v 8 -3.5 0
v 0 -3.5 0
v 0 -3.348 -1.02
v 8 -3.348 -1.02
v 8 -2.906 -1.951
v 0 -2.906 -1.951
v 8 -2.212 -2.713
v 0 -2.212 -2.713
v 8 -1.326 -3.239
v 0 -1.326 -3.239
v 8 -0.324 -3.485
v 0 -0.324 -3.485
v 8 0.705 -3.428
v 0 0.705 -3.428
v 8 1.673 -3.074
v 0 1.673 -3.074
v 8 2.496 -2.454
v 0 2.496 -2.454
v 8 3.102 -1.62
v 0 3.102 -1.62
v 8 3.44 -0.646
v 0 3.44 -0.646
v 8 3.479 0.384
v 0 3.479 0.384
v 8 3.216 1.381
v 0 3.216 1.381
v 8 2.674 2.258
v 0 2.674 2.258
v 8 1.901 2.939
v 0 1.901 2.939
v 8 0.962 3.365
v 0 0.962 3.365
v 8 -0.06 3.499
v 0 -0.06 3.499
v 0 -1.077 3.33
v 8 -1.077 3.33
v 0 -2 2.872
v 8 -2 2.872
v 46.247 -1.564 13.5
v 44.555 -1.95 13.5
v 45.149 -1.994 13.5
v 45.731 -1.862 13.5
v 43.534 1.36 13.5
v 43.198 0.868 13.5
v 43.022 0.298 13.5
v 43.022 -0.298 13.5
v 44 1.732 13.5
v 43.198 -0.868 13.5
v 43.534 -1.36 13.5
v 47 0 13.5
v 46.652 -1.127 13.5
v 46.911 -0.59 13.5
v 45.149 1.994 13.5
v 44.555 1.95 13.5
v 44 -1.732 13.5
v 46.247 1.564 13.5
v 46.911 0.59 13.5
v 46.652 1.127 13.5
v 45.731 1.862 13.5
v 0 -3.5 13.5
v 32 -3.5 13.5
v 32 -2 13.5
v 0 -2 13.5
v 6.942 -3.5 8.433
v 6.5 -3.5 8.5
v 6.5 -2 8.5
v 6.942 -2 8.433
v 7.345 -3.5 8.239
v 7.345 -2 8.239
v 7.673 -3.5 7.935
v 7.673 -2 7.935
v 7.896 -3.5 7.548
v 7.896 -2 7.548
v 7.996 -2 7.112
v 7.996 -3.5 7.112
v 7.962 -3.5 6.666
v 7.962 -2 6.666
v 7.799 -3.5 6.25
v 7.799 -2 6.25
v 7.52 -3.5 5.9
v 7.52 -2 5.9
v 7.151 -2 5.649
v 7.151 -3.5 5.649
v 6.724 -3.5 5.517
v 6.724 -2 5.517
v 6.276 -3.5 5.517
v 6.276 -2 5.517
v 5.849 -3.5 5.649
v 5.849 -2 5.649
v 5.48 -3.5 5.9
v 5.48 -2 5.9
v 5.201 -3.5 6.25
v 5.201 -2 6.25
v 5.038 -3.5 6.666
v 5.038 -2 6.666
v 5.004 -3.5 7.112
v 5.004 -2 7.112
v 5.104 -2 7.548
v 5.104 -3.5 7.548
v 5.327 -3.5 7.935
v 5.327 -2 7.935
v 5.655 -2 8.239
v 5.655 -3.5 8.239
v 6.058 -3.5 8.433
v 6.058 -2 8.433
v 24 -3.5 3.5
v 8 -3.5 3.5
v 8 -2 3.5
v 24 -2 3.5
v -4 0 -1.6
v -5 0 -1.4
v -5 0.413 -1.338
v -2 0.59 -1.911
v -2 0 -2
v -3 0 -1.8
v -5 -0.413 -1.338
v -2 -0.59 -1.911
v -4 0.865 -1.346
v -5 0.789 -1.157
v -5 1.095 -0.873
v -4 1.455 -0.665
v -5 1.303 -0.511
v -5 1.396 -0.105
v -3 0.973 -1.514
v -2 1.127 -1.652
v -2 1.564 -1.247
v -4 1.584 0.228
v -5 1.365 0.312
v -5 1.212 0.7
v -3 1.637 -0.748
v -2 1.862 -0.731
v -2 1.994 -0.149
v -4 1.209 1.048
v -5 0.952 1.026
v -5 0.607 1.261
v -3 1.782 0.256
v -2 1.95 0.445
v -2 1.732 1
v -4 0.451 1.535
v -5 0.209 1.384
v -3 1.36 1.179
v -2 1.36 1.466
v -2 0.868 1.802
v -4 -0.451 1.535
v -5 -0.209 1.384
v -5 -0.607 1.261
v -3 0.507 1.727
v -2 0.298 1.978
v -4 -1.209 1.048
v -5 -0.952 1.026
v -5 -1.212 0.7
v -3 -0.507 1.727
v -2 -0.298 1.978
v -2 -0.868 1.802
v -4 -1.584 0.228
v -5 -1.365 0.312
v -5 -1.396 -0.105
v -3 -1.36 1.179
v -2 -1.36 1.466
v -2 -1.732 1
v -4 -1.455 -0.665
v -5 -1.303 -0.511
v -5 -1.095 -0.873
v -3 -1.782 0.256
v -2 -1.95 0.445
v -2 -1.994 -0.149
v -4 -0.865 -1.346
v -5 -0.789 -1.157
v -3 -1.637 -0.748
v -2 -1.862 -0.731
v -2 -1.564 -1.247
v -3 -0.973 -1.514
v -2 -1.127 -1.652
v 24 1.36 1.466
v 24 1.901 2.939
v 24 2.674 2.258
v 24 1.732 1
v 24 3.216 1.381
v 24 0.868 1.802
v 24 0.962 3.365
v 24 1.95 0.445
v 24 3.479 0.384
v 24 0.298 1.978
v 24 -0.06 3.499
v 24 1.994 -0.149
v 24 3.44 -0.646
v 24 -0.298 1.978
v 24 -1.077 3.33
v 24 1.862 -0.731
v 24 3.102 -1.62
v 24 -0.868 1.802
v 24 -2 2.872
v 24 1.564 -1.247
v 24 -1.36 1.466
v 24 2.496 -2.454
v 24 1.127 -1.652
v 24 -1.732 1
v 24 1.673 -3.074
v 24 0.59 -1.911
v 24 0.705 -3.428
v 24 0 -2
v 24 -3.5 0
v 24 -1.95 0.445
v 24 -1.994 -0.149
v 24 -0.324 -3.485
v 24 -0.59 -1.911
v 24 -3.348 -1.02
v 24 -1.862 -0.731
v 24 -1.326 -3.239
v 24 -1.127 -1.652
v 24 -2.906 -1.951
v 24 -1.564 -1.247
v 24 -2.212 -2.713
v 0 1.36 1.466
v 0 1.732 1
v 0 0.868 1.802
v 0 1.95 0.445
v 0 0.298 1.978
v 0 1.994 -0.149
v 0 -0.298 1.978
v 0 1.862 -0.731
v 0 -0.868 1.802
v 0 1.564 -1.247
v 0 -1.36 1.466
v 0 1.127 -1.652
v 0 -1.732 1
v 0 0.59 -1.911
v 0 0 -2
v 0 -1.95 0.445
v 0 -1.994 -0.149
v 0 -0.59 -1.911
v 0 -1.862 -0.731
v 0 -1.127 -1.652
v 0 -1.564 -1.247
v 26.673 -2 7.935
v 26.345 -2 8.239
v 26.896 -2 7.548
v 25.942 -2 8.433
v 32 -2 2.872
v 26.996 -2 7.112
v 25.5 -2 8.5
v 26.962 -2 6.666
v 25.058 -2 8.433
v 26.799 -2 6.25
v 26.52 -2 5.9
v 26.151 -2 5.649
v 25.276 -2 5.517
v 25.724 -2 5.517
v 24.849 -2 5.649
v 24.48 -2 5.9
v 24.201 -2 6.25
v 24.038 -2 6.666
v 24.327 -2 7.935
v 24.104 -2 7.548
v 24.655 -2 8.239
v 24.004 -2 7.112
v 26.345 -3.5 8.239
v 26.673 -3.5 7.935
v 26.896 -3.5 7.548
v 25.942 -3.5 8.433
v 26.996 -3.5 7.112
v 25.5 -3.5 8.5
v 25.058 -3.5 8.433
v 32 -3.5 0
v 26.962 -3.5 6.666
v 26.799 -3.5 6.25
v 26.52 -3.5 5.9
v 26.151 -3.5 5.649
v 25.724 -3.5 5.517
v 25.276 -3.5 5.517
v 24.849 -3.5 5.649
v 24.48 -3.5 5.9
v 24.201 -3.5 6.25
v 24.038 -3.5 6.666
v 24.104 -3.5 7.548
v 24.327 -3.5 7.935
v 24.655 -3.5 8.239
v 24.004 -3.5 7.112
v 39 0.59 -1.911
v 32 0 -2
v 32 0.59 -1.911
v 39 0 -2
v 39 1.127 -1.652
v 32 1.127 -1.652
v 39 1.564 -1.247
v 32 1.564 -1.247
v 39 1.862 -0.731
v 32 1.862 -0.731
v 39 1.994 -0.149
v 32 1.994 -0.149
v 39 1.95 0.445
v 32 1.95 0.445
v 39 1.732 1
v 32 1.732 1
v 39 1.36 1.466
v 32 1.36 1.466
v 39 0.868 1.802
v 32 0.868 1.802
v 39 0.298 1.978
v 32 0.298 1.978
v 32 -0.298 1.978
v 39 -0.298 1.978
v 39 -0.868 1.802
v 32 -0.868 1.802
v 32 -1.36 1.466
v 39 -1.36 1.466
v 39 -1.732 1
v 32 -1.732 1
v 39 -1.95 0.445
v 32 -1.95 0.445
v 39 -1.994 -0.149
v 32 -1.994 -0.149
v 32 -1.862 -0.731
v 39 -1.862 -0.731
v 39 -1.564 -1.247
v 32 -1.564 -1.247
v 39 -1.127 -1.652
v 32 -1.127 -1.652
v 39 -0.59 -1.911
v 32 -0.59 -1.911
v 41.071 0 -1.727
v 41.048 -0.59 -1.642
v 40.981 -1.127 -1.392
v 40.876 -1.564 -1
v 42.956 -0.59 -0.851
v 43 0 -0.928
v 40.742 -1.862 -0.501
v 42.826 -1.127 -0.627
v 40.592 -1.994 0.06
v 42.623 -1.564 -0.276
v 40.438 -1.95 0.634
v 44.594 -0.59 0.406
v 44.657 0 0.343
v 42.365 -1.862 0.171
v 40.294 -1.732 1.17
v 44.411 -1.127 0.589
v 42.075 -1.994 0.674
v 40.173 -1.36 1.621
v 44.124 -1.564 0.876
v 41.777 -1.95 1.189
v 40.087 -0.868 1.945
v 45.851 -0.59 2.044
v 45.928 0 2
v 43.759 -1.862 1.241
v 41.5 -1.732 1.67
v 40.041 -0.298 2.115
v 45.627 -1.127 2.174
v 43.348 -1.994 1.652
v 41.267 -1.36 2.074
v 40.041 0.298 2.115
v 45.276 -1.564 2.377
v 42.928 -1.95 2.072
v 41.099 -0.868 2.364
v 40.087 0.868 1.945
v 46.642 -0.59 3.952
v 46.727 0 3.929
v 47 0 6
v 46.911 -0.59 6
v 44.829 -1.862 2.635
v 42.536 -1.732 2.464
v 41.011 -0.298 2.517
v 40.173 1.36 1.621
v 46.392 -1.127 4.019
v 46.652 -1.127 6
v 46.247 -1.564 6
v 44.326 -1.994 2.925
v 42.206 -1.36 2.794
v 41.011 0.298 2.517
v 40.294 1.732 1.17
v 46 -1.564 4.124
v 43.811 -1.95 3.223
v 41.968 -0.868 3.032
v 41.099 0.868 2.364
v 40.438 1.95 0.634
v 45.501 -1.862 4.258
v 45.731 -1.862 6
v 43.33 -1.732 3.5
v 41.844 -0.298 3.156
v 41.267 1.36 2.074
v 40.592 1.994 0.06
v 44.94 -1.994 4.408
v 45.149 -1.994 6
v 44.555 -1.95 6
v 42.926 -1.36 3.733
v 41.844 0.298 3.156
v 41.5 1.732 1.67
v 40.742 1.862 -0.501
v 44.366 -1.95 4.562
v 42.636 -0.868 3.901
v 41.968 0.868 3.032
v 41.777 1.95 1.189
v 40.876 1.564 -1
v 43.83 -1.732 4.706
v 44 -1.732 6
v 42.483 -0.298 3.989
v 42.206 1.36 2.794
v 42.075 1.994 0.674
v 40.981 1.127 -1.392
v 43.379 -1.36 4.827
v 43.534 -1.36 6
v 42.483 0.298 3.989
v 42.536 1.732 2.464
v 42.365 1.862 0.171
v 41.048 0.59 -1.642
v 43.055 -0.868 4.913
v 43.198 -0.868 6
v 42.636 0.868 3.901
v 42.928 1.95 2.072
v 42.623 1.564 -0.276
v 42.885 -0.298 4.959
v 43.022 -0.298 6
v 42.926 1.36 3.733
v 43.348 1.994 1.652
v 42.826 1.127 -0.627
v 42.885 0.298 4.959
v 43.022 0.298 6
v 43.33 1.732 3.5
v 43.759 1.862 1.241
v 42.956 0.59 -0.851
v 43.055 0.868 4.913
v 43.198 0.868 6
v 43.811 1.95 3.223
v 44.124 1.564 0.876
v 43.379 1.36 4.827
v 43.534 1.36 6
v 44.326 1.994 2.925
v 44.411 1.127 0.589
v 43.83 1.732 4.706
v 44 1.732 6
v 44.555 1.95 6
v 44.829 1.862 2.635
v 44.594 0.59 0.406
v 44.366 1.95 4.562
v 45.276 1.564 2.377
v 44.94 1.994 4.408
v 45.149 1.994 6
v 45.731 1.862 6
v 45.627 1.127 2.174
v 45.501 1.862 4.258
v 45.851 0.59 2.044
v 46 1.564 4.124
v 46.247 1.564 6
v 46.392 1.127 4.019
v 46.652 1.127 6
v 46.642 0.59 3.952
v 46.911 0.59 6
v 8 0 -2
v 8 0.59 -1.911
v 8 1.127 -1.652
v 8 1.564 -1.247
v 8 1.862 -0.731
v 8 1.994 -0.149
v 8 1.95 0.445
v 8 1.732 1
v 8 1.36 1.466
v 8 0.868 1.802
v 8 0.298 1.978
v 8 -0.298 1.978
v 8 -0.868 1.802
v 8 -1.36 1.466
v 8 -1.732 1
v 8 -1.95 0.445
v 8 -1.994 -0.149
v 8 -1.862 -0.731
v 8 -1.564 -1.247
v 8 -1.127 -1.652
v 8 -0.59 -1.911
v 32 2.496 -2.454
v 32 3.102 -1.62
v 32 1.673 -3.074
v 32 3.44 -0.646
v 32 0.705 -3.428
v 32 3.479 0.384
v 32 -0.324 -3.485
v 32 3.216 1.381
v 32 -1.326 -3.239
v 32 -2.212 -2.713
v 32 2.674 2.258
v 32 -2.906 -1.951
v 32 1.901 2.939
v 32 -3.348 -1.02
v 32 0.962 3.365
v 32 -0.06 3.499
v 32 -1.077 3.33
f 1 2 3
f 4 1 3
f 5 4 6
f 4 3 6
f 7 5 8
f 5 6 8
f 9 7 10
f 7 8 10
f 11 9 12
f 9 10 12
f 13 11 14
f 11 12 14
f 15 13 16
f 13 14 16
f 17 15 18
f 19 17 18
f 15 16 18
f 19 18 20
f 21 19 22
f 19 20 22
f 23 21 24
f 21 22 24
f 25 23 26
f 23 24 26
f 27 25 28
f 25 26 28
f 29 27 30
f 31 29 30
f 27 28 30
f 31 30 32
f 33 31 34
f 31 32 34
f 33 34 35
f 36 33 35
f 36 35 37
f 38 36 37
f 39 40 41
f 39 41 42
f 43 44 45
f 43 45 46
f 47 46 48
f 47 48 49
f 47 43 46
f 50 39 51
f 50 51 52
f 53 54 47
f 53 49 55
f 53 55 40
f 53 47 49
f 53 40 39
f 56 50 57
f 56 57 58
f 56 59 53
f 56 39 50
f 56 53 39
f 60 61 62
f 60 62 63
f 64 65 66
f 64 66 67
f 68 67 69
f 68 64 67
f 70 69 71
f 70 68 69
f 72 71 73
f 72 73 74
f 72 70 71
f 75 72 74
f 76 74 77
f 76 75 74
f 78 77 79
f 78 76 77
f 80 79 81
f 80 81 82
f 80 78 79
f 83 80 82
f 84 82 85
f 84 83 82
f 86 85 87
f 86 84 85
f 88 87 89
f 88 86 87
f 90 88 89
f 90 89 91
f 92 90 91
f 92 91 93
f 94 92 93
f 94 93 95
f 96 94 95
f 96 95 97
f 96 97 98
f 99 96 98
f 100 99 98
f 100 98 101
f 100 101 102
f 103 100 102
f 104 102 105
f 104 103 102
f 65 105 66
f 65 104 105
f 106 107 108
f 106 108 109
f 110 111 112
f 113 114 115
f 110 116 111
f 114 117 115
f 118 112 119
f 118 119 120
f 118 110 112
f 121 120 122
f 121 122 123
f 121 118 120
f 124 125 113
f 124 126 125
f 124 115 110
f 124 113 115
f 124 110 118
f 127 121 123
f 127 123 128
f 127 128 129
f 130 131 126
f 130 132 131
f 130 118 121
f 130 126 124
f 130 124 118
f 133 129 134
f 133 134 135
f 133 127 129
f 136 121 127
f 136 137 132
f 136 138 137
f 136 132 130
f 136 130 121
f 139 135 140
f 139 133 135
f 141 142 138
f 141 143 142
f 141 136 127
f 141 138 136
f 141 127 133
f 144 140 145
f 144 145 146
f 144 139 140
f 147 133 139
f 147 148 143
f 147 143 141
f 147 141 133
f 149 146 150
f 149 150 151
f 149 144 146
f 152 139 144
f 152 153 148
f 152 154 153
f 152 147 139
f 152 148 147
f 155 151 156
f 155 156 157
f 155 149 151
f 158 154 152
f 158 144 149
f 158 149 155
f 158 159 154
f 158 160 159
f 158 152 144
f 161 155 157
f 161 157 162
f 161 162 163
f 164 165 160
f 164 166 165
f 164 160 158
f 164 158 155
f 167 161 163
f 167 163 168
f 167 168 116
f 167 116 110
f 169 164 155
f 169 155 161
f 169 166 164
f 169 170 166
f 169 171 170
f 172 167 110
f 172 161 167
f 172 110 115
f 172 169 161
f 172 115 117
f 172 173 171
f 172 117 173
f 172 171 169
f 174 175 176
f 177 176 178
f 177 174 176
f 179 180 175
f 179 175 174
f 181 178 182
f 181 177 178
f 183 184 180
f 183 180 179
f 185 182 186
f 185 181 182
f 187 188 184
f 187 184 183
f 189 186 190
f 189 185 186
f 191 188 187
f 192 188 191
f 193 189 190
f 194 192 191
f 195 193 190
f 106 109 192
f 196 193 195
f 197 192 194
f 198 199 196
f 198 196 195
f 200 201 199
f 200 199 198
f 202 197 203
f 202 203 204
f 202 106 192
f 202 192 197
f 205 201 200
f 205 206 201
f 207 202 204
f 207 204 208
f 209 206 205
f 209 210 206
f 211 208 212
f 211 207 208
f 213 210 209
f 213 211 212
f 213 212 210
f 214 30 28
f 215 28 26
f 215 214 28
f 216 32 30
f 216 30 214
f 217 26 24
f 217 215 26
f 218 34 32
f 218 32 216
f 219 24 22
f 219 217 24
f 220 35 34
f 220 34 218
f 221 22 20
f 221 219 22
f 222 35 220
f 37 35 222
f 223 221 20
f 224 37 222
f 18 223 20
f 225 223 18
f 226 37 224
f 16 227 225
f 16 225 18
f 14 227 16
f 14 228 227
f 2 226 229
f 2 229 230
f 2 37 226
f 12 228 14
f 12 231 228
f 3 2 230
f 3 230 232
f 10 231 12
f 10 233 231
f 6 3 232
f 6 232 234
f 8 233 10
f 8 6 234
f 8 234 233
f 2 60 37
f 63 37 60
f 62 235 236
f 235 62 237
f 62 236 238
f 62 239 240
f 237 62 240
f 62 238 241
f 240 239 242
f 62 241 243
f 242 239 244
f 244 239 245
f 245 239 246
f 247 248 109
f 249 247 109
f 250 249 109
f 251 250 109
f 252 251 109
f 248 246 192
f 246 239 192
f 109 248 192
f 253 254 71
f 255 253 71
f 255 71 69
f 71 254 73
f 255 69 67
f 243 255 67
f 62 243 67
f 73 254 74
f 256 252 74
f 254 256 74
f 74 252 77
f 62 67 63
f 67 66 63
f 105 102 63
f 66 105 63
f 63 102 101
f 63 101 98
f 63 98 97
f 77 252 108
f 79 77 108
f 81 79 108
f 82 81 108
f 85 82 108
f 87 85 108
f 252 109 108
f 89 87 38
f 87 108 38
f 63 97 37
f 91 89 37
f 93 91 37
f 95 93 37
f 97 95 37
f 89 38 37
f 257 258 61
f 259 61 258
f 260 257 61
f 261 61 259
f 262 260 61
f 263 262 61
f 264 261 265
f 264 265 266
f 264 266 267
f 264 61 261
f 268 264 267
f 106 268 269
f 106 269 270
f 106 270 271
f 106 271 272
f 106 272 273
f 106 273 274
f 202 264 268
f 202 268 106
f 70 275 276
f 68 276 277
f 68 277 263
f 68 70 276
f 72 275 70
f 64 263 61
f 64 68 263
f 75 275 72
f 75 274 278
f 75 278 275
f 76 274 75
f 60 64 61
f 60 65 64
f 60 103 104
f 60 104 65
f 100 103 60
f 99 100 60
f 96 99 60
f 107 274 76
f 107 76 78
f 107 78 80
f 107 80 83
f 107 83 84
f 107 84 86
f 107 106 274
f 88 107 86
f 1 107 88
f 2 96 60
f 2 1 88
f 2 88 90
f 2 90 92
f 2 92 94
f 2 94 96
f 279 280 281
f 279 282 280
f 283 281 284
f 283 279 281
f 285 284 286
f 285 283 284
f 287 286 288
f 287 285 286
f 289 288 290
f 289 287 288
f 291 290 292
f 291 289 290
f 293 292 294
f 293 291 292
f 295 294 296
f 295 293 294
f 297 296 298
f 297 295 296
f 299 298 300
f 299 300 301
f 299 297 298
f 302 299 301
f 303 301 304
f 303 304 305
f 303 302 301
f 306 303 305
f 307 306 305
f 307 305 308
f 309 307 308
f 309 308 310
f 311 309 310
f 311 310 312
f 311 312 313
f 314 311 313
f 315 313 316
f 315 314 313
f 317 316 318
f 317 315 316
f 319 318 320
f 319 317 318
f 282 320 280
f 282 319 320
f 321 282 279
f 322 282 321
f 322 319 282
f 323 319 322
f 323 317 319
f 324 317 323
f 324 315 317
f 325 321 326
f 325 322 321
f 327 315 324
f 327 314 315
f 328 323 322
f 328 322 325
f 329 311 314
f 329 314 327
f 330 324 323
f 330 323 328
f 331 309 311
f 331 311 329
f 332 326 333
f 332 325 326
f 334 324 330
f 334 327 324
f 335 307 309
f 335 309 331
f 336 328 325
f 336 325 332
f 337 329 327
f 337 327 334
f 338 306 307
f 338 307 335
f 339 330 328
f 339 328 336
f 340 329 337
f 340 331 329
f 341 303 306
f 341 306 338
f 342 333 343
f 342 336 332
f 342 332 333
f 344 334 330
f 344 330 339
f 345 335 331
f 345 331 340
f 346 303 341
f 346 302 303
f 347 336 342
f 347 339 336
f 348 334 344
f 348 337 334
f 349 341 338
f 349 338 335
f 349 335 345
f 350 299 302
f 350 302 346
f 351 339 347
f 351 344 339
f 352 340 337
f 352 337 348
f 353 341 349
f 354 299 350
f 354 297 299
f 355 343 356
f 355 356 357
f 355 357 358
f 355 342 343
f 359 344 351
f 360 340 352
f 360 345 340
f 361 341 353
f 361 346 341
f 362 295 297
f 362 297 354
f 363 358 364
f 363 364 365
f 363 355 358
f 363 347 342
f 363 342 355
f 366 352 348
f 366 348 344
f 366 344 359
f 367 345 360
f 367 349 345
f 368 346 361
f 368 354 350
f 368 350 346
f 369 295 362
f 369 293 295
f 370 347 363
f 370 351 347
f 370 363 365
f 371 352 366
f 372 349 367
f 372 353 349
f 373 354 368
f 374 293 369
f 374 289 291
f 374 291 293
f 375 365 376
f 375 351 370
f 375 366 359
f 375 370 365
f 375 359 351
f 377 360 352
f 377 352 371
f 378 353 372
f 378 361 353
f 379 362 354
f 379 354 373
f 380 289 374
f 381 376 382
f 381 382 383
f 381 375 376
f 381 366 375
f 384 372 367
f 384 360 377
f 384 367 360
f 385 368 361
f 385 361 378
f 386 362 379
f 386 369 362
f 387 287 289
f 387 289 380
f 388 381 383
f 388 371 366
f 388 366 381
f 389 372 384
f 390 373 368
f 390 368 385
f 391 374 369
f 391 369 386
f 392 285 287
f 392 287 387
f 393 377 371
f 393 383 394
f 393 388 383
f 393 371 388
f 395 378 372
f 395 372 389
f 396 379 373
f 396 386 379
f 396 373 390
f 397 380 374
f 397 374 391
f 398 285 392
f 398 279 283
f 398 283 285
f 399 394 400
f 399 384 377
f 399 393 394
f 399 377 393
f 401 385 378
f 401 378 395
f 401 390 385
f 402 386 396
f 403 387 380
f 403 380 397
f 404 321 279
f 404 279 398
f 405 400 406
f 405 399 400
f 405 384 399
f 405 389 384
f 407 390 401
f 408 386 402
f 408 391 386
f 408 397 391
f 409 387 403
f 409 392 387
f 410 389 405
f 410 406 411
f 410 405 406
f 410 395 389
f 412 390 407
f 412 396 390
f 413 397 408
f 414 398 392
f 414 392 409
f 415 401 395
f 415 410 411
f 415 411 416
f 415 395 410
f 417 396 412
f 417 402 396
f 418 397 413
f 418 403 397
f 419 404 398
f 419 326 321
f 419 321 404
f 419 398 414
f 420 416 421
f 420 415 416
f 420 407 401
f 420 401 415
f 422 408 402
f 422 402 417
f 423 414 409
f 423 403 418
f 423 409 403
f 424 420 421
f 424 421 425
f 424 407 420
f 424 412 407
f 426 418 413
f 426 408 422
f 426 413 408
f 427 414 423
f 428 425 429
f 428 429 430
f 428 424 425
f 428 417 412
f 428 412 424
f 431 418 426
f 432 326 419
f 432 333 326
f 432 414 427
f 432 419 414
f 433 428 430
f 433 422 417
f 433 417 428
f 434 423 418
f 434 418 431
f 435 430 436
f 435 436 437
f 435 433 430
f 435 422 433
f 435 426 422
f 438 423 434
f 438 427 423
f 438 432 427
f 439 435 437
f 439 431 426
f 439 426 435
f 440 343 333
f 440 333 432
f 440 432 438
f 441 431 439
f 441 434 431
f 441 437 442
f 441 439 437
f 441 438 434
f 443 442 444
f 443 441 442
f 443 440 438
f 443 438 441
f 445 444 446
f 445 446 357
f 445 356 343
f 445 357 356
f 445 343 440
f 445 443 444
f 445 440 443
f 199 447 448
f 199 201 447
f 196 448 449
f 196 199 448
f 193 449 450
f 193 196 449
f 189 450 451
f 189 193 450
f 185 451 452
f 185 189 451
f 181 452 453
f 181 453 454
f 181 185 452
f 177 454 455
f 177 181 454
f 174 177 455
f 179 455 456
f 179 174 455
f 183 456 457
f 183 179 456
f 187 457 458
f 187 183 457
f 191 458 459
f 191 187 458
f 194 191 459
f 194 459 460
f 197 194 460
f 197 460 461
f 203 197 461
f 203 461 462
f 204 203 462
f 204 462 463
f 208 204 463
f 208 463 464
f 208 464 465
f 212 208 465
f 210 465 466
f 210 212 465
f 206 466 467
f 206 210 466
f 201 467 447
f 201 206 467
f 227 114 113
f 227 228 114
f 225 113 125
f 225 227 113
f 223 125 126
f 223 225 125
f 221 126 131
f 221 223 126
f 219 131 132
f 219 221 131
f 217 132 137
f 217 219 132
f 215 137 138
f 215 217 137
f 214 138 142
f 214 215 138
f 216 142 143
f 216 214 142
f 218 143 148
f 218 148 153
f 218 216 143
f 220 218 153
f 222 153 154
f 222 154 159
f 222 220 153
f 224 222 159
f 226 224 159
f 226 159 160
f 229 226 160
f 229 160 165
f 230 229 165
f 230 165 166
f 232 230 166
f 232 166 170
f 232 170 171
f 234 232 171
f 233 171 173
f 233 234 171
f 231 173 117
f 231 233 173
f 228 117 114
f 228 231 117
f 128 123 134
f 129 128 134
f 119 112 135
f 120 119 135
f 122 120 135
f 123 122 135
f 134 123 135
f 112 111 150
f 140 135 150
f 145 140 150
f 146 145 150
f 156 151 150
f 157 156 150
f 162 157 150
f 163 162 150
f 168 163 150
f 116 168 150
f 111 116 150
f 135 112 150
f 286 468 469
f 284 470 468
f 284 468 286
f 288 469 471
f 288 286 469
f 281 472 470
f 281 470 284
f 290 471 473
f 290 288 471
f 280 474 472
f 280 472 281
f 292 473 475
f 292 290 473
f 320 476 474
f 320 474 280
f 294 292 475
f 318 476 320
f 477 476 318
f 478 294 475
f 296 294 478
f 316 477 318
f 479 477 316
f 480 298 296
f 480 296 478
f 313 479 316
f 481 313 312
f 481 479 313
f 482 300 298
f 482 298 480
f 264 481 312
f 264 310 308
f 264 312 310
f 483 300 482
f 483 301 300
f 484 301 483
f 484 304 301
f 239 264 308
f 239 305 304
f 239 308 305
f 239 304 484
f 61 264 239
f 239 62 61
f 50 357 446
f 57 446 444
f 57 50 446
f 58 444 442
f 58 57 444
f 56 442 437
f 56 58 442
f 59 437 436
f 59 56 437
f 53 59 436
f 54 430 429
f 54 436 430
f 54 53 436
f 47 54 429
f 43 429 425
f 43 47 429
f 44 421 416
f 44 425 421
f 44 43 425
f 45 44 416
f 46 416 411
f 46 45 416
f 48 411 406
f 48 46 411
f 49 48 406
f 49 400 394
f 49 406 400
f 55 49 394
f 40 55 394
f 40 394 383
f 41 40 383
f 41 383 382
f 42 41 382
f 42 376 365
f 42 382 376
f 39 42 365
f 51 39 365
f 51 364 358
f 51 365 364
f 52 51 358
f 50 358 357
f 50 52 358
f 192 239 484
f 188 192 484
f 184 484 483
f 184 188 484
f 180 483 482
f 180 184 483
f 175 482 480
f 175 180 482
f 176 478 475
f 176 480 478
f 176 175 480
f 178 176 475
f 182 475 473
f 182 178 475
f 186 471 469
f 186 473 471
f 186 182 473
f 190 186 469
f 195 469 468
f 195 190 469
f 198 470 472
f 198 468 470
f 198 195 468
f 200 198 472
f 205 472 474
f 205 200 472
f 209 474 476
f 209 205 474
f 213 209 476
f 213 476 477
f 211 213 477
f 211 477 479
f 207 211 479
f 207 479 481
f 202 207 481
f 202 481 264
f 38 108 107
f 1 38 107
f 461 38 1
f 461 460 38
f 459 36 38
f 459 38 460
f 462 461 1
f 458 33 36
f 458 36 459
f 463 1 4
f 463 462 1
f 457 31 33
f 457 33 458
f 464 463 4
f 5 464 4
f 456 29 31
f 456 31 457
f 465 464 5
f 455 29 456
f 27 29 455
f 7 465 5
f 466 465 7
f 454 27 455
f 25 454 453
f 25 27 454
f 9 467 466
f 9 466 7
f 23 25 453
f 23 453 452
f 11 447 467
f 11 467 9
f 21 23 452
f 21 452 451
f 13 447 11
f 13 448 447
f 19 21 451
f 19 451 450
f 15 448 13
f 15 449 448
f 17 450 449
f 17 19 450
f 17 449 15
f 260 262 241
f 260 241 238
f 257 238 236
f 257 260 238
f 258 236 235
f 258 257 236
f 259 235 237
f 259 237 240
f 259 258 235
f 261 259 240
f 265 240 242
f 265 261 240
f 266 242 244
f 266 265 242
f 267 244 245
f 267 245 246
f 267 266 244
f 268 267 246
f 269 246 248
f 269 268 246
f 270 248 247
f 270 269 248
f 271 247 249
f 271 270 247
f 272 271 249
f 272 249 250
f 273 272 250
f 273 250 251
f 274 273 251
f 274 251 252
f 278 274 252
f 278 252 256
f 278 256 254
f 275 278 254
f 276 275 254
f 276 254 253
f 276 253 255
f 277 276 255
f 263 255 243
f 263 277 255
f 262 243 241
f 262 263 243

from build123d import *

# Parameters (mm, degrees)
SKETCH_6_R      = 3.5
EXTRUDE_4_DEPTH = 8
EXTRUDE_START   = -24
SKETCH_7_R      = 3.5
EXTRUDE_5_DEPTH = 8
EXTRUDE_START_2 = -3.5
SKETCH_8_R      = 1.5
EXTRUDE_6_DEPTH = 1.5
SKETCH_10_R     = 2


with BuildPart() as part:
    # 草图6 → 凸台-拉伸4 (new body)
    with BuildSketch(Plane(origin=(0, 0, 0), x_dir=(0, 0, -1), z_dir=(1, 0, 0))):
        Circle(SKETCH_6_R)
    extrude(amount=EXTRUDE_4_DEPTH)



with BuildPart() as body_2:
    # 草图7 → 凸台-拉伸5 (new body)
    with BuildSketch(Plane.ZY.offset(EXTRUDE_START)):
        with Locations(Location((0, 0, 0), (0, 0, 180))):
            Circle(SKETCH_7_R)
    extrude(amount=-EXTRUDE_5_DEPTH)


with BuildPart() as part_1:
    add(part.part)

    add(body_2.part)  # 凸台-拉伸6 merges body 2
    # 草图8 → 凸台-拉伸6 (add)
    with BuildSketch(Plane(origin=(0, 0, 0), x_dir=(1, 0, 0), z_dir=(0, 1, 0)).offset(EXTRUDE_START_2)):
        Polygon((0, 0), (8, 0), (8, -3.5), (24, -3.5), (24, 0), (32, 0), (32, -13.5), (0, -13.5), align=None)
        with Locations(Location((25.5, -7, 0), (0, 0, 270))):
            Circle(SKETCH_8_R, mode=Mode.SUBTRACT)
        with Locations(Location((6.5, -7, 0), (0, 0, 270))):
            Circle(SKETCH_8_R, mode=Mode.SUBTRACT)
    extrude(amount=EXTRUDE_6_DEPTH)

    # 扫描1: sweep along a path in 草图9
    with BuildLine(Plane(origin=(0, 0, 0), x_dir=(1, 0, 0), z_dir=(0, 1, 0))) as sweep_1_path:
        Line((-5, 0), (39, 0))
        ThreePointArc((39, 0), (43.242640687, -1.757359313), (45, -6))
        Line((45, -6), (45, -13.5))
    # 草图10 → 扫描1 (sweep)
    with BuildSketch(Plane(origin=(-5, 0, 0), x_dir=(0, 0, -1), z_dir=(1, 0, 0))):
        Circle(SKETCH_10_R)
    sweep(path=sweep_1_path.line)

    # 草图11 → 切除-旋转1 (revolve, cut)
    with BuildSketch(Plane(origin=(0, 0, 0), x_dir=(1, 0, 0), z_dir=(0, 1, 0))):
        Polygon((-2, 2), (-5, 2), (-5, 1.4), align=None)
    revolve(axis=Axis((-14.922922677, 0, 0), (1, 0, 0)), mode=Mode.SUBTRACT)


solid = part_1.part
